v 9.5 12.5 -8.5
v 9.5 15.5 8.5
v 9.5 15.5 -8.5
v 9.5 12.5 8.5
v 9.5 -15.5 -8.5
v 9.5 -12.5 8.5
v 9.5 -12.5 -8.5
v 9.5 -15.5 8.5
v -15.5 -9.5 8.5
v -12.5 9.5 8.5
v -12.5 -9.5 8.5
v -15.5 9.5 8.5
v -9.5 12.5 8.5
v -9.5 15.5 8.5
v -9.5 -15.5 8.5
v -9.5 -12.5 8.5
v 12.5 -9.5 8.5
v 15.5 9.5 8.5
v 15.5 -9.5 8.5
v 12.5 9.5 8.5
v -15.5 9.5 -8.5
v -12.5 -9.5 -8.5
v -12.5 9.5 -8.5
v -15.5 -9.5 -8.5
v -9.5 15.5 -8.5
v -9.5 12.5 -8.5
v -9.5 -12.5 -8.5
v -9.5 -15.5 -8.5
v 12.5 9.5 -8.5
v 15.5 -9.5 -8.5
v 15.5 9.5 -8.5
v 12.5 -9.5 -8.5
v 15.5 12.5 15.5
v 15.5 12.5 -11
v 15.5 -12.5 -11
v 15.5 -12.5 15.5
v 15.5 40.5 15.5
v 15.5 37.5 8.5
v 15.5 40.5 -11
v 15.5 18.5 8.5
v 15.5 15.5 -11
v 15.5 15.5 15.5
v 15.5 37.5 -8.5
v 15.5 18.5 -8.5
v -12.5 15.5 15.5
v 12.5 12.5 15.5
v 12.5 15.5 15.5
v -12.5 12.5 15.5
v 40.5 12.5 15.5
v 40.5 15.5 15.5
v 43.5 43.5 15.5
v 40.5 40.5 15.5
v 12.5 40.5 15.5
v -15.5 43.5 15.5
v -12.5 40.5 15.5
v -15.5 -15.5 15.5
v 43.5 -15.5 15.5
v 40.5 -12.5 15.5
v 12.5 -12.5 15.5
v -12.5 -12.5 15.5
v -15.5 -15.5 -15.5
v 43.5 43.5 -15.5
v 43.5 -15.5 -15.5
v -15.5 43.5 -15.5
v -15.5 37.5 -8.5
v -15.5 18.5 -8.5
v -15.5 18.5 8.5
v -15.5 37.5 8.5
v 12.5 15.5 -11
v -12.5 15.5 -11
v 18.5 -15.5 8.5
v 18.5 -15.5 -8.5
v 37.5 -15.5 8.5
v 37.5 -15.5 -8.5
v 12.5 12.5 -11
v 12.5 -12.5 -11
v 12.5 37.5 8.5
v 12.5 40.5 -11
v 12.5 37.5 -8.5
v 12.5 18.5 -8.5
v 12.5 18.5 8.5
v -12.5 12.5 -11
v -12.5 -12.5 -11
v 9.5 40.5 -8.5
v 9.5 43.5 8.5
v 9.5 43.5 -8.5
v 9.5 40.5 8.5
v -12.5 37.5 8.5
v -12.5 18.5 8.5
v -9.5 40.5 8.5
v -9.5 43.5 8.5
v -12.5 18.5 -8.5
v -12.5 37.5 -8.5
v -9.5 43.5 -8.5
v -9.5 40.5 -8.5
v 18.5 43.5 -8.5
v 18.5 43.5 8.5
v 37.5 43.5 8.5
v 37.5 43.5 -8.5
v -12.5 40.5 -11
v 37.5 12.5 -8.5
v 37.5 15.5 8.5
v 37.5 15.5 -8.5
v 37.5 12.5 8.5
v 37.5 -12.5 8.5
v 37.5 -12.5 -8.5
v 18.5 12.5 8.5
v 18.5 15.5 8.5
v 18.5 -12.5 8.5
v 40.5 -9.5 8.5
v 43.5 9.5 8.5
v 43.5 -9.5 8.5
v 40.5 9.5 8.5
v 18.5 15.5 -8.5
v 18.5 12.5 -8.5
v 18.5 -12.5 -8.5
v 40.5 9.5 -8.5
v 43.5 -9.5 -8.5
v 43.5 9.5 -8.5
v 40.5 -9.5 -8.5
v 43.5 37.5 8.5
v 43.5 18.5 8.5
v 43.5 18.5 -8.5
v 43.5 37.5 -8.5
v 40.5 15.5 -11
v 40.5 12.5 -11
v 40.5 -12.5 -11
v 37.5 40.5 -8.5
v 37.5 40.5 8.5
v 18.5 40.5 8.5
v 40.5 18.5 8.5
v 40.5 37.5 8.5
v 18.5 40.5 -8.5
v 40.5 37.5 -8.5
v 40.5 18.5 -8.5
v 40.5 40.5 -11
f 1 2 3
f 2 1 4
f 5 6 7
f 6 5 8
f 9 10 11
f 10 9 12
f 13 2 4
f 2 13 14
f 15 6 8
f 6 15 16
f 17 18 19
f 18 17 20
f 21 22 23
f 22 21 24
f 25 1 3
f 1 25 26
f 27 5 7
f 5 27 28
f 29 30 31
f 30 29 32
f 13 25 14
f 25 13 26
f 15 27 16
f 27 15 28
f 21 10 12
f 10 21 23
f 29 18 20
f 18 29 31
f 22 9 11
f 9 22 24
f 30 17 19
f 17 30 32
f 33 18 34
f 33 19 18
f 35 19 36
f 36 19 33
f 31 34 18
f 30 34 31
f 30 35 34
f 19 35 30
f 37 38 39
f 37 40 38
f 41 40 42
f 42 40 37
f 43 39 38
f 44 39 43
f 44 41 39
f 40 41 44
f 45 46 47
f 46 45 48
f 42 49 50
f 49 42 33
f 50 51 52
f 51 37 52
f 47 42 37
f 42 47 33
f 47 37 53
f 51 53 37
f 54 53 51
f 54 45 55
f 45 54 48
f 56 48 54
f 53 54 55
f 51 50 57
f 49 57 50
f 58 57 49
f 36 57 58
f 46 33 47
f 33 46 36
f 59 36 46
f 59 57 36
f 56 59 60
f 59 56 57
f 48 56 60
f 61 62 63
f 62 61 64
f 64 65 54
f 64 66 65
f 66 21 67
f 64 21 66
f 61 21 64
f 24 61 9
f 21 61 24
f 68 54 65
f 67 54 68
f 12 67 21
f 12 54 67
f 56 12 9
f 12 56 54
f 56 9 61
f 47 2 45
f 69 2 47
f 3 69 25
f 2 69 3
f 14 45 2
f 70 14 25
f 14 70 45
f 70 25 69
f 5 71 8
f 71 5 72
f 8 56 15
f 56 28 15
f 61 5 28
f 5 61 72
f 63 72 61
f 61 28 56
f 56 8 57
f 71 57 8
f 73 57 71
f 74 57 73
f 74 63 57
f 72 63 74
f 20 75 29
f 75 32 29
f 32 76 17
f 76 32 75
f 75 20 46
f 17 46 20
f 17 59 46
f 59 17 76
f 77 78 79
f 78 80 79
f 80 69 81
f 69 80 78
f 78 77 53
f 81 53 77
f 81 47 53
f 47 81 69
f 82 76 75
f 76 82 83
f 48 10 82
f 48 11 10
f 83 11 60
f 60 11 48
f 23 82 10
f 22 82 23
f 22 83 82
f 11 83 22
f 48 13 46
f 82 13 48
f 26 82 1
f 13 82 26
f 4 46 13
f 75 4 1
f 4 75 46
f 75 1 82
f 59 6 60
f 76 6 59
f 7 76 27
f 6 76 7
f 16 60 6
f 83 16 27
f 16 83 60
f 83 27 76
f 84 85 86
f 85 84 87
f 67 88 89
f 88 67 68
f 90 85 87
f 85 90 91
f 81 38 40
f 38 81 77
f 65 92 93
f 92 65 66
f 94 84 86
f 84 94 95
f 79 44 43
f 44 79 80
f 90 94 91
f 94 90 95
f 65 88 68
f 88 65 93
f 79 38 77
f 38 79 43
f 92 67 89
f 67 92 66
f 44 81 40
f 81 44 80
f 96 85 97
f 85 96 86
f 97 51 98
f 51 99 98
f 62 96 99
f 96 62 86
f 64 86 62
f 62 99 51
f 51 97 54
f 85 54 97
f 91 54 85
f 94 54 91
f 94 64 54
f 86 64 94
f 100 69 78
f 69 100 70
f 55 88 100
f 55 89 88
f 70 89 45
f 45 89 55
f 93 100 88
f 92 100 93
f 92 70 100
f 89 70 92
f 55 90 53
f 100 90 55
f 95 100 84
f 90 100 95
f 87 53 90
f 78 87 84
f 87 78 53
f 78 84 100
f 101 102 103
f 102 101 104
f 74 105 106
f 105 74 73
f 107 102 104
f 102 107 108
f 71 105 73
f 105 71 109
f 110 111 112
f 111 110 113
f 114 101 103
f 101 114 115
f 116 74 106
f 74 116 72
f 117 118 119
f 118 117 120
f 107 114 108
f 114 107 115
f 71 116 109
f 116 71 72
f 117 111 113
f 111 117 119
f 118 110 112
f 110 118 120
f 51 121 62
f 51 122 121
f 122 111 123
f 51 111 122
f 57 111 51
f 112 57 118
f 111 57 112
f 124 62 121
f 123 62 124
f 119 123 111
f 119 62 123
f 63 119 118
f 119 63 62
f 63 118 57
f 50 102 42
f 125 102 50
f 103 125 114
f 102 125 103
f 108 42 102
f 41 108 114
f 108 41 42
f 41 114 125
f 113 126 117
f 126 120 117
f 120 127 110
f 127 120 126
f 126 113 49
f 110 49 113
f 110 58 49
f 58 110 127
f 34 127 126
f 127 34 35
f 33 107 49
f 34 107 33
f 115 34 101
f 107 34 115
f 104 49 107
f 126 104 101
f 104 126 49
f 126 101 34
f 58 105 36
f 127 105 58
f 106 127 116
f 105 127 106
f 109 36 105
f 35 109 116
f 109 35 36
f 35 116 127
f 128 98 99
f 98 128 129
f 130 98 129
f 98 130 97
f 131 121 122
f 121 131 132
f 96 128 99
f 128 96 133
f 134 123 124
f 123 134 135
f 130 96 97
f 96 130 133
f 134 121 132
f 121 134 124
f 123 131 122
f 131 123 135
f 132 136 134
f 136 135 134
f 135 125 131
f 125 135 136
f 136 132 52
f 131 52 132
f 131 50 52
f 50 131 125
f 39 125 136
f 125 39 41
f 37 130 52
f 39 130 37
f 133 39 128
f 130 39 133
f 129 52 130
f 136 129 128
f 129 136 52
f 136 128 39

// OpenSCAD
//  Size of the holes in each container  
hole_size = 25; //  [1:100]

//  The thicknes of each wall around the hole
wall_thickness = 3; // [1,2,3,4,5,6,7,8,9,10]

//  How many containers on the x axis
containers_length = 2; // [1,2,3,4,5,6,7,8,9,10]

//  How many containers on the y axis
containers_width = 2; // [1,2,3,4,5,6,7,8,9,10]

//  Holes in walls
wall_holes_enabled = "yes"; // ["yes","no"]

//  Height multiplier
height_multiplier = 1; // [0.5,1,2]

for(x = [0:containers_length-1]){
    for(y = [0:containers_width-1]){
        
        translate([x*(hole_size+wall_thickness),y*(hole_size+wall_thickness),0]){
        
            difference() {
                //Outer walls
                cube([hole_size+(wall_thickness*2),hole_size+(wall_thickness*2),(hole_size+(wall_thickness*2))*height_multiplier],center=true);
                //Hole
                translate([0,0,wall_thickness]){
                    cube([hole_size, hole_size,(hole_size+wall_thickness)*height_multiplier],center=true);
                    
                }
                
                if(wall_holes_enabled == "yes"){
                    //Wall Holes Y
                    cube([hole_size-wall_thickness*2,.5+hole_size+wall_thickness*2,(hole_size*height_multiplier*.7)-.5],center=true);
                    
                    //Wall Holes X
                    cube([.5+hole_size+wall_thickness*2,hole_size-wall_thickness*2,(hole_size*height_multiplier*.7)-.5],center=true);
                }
            }
        } // end translate x and y
    } // end y loop
} // end x loop
